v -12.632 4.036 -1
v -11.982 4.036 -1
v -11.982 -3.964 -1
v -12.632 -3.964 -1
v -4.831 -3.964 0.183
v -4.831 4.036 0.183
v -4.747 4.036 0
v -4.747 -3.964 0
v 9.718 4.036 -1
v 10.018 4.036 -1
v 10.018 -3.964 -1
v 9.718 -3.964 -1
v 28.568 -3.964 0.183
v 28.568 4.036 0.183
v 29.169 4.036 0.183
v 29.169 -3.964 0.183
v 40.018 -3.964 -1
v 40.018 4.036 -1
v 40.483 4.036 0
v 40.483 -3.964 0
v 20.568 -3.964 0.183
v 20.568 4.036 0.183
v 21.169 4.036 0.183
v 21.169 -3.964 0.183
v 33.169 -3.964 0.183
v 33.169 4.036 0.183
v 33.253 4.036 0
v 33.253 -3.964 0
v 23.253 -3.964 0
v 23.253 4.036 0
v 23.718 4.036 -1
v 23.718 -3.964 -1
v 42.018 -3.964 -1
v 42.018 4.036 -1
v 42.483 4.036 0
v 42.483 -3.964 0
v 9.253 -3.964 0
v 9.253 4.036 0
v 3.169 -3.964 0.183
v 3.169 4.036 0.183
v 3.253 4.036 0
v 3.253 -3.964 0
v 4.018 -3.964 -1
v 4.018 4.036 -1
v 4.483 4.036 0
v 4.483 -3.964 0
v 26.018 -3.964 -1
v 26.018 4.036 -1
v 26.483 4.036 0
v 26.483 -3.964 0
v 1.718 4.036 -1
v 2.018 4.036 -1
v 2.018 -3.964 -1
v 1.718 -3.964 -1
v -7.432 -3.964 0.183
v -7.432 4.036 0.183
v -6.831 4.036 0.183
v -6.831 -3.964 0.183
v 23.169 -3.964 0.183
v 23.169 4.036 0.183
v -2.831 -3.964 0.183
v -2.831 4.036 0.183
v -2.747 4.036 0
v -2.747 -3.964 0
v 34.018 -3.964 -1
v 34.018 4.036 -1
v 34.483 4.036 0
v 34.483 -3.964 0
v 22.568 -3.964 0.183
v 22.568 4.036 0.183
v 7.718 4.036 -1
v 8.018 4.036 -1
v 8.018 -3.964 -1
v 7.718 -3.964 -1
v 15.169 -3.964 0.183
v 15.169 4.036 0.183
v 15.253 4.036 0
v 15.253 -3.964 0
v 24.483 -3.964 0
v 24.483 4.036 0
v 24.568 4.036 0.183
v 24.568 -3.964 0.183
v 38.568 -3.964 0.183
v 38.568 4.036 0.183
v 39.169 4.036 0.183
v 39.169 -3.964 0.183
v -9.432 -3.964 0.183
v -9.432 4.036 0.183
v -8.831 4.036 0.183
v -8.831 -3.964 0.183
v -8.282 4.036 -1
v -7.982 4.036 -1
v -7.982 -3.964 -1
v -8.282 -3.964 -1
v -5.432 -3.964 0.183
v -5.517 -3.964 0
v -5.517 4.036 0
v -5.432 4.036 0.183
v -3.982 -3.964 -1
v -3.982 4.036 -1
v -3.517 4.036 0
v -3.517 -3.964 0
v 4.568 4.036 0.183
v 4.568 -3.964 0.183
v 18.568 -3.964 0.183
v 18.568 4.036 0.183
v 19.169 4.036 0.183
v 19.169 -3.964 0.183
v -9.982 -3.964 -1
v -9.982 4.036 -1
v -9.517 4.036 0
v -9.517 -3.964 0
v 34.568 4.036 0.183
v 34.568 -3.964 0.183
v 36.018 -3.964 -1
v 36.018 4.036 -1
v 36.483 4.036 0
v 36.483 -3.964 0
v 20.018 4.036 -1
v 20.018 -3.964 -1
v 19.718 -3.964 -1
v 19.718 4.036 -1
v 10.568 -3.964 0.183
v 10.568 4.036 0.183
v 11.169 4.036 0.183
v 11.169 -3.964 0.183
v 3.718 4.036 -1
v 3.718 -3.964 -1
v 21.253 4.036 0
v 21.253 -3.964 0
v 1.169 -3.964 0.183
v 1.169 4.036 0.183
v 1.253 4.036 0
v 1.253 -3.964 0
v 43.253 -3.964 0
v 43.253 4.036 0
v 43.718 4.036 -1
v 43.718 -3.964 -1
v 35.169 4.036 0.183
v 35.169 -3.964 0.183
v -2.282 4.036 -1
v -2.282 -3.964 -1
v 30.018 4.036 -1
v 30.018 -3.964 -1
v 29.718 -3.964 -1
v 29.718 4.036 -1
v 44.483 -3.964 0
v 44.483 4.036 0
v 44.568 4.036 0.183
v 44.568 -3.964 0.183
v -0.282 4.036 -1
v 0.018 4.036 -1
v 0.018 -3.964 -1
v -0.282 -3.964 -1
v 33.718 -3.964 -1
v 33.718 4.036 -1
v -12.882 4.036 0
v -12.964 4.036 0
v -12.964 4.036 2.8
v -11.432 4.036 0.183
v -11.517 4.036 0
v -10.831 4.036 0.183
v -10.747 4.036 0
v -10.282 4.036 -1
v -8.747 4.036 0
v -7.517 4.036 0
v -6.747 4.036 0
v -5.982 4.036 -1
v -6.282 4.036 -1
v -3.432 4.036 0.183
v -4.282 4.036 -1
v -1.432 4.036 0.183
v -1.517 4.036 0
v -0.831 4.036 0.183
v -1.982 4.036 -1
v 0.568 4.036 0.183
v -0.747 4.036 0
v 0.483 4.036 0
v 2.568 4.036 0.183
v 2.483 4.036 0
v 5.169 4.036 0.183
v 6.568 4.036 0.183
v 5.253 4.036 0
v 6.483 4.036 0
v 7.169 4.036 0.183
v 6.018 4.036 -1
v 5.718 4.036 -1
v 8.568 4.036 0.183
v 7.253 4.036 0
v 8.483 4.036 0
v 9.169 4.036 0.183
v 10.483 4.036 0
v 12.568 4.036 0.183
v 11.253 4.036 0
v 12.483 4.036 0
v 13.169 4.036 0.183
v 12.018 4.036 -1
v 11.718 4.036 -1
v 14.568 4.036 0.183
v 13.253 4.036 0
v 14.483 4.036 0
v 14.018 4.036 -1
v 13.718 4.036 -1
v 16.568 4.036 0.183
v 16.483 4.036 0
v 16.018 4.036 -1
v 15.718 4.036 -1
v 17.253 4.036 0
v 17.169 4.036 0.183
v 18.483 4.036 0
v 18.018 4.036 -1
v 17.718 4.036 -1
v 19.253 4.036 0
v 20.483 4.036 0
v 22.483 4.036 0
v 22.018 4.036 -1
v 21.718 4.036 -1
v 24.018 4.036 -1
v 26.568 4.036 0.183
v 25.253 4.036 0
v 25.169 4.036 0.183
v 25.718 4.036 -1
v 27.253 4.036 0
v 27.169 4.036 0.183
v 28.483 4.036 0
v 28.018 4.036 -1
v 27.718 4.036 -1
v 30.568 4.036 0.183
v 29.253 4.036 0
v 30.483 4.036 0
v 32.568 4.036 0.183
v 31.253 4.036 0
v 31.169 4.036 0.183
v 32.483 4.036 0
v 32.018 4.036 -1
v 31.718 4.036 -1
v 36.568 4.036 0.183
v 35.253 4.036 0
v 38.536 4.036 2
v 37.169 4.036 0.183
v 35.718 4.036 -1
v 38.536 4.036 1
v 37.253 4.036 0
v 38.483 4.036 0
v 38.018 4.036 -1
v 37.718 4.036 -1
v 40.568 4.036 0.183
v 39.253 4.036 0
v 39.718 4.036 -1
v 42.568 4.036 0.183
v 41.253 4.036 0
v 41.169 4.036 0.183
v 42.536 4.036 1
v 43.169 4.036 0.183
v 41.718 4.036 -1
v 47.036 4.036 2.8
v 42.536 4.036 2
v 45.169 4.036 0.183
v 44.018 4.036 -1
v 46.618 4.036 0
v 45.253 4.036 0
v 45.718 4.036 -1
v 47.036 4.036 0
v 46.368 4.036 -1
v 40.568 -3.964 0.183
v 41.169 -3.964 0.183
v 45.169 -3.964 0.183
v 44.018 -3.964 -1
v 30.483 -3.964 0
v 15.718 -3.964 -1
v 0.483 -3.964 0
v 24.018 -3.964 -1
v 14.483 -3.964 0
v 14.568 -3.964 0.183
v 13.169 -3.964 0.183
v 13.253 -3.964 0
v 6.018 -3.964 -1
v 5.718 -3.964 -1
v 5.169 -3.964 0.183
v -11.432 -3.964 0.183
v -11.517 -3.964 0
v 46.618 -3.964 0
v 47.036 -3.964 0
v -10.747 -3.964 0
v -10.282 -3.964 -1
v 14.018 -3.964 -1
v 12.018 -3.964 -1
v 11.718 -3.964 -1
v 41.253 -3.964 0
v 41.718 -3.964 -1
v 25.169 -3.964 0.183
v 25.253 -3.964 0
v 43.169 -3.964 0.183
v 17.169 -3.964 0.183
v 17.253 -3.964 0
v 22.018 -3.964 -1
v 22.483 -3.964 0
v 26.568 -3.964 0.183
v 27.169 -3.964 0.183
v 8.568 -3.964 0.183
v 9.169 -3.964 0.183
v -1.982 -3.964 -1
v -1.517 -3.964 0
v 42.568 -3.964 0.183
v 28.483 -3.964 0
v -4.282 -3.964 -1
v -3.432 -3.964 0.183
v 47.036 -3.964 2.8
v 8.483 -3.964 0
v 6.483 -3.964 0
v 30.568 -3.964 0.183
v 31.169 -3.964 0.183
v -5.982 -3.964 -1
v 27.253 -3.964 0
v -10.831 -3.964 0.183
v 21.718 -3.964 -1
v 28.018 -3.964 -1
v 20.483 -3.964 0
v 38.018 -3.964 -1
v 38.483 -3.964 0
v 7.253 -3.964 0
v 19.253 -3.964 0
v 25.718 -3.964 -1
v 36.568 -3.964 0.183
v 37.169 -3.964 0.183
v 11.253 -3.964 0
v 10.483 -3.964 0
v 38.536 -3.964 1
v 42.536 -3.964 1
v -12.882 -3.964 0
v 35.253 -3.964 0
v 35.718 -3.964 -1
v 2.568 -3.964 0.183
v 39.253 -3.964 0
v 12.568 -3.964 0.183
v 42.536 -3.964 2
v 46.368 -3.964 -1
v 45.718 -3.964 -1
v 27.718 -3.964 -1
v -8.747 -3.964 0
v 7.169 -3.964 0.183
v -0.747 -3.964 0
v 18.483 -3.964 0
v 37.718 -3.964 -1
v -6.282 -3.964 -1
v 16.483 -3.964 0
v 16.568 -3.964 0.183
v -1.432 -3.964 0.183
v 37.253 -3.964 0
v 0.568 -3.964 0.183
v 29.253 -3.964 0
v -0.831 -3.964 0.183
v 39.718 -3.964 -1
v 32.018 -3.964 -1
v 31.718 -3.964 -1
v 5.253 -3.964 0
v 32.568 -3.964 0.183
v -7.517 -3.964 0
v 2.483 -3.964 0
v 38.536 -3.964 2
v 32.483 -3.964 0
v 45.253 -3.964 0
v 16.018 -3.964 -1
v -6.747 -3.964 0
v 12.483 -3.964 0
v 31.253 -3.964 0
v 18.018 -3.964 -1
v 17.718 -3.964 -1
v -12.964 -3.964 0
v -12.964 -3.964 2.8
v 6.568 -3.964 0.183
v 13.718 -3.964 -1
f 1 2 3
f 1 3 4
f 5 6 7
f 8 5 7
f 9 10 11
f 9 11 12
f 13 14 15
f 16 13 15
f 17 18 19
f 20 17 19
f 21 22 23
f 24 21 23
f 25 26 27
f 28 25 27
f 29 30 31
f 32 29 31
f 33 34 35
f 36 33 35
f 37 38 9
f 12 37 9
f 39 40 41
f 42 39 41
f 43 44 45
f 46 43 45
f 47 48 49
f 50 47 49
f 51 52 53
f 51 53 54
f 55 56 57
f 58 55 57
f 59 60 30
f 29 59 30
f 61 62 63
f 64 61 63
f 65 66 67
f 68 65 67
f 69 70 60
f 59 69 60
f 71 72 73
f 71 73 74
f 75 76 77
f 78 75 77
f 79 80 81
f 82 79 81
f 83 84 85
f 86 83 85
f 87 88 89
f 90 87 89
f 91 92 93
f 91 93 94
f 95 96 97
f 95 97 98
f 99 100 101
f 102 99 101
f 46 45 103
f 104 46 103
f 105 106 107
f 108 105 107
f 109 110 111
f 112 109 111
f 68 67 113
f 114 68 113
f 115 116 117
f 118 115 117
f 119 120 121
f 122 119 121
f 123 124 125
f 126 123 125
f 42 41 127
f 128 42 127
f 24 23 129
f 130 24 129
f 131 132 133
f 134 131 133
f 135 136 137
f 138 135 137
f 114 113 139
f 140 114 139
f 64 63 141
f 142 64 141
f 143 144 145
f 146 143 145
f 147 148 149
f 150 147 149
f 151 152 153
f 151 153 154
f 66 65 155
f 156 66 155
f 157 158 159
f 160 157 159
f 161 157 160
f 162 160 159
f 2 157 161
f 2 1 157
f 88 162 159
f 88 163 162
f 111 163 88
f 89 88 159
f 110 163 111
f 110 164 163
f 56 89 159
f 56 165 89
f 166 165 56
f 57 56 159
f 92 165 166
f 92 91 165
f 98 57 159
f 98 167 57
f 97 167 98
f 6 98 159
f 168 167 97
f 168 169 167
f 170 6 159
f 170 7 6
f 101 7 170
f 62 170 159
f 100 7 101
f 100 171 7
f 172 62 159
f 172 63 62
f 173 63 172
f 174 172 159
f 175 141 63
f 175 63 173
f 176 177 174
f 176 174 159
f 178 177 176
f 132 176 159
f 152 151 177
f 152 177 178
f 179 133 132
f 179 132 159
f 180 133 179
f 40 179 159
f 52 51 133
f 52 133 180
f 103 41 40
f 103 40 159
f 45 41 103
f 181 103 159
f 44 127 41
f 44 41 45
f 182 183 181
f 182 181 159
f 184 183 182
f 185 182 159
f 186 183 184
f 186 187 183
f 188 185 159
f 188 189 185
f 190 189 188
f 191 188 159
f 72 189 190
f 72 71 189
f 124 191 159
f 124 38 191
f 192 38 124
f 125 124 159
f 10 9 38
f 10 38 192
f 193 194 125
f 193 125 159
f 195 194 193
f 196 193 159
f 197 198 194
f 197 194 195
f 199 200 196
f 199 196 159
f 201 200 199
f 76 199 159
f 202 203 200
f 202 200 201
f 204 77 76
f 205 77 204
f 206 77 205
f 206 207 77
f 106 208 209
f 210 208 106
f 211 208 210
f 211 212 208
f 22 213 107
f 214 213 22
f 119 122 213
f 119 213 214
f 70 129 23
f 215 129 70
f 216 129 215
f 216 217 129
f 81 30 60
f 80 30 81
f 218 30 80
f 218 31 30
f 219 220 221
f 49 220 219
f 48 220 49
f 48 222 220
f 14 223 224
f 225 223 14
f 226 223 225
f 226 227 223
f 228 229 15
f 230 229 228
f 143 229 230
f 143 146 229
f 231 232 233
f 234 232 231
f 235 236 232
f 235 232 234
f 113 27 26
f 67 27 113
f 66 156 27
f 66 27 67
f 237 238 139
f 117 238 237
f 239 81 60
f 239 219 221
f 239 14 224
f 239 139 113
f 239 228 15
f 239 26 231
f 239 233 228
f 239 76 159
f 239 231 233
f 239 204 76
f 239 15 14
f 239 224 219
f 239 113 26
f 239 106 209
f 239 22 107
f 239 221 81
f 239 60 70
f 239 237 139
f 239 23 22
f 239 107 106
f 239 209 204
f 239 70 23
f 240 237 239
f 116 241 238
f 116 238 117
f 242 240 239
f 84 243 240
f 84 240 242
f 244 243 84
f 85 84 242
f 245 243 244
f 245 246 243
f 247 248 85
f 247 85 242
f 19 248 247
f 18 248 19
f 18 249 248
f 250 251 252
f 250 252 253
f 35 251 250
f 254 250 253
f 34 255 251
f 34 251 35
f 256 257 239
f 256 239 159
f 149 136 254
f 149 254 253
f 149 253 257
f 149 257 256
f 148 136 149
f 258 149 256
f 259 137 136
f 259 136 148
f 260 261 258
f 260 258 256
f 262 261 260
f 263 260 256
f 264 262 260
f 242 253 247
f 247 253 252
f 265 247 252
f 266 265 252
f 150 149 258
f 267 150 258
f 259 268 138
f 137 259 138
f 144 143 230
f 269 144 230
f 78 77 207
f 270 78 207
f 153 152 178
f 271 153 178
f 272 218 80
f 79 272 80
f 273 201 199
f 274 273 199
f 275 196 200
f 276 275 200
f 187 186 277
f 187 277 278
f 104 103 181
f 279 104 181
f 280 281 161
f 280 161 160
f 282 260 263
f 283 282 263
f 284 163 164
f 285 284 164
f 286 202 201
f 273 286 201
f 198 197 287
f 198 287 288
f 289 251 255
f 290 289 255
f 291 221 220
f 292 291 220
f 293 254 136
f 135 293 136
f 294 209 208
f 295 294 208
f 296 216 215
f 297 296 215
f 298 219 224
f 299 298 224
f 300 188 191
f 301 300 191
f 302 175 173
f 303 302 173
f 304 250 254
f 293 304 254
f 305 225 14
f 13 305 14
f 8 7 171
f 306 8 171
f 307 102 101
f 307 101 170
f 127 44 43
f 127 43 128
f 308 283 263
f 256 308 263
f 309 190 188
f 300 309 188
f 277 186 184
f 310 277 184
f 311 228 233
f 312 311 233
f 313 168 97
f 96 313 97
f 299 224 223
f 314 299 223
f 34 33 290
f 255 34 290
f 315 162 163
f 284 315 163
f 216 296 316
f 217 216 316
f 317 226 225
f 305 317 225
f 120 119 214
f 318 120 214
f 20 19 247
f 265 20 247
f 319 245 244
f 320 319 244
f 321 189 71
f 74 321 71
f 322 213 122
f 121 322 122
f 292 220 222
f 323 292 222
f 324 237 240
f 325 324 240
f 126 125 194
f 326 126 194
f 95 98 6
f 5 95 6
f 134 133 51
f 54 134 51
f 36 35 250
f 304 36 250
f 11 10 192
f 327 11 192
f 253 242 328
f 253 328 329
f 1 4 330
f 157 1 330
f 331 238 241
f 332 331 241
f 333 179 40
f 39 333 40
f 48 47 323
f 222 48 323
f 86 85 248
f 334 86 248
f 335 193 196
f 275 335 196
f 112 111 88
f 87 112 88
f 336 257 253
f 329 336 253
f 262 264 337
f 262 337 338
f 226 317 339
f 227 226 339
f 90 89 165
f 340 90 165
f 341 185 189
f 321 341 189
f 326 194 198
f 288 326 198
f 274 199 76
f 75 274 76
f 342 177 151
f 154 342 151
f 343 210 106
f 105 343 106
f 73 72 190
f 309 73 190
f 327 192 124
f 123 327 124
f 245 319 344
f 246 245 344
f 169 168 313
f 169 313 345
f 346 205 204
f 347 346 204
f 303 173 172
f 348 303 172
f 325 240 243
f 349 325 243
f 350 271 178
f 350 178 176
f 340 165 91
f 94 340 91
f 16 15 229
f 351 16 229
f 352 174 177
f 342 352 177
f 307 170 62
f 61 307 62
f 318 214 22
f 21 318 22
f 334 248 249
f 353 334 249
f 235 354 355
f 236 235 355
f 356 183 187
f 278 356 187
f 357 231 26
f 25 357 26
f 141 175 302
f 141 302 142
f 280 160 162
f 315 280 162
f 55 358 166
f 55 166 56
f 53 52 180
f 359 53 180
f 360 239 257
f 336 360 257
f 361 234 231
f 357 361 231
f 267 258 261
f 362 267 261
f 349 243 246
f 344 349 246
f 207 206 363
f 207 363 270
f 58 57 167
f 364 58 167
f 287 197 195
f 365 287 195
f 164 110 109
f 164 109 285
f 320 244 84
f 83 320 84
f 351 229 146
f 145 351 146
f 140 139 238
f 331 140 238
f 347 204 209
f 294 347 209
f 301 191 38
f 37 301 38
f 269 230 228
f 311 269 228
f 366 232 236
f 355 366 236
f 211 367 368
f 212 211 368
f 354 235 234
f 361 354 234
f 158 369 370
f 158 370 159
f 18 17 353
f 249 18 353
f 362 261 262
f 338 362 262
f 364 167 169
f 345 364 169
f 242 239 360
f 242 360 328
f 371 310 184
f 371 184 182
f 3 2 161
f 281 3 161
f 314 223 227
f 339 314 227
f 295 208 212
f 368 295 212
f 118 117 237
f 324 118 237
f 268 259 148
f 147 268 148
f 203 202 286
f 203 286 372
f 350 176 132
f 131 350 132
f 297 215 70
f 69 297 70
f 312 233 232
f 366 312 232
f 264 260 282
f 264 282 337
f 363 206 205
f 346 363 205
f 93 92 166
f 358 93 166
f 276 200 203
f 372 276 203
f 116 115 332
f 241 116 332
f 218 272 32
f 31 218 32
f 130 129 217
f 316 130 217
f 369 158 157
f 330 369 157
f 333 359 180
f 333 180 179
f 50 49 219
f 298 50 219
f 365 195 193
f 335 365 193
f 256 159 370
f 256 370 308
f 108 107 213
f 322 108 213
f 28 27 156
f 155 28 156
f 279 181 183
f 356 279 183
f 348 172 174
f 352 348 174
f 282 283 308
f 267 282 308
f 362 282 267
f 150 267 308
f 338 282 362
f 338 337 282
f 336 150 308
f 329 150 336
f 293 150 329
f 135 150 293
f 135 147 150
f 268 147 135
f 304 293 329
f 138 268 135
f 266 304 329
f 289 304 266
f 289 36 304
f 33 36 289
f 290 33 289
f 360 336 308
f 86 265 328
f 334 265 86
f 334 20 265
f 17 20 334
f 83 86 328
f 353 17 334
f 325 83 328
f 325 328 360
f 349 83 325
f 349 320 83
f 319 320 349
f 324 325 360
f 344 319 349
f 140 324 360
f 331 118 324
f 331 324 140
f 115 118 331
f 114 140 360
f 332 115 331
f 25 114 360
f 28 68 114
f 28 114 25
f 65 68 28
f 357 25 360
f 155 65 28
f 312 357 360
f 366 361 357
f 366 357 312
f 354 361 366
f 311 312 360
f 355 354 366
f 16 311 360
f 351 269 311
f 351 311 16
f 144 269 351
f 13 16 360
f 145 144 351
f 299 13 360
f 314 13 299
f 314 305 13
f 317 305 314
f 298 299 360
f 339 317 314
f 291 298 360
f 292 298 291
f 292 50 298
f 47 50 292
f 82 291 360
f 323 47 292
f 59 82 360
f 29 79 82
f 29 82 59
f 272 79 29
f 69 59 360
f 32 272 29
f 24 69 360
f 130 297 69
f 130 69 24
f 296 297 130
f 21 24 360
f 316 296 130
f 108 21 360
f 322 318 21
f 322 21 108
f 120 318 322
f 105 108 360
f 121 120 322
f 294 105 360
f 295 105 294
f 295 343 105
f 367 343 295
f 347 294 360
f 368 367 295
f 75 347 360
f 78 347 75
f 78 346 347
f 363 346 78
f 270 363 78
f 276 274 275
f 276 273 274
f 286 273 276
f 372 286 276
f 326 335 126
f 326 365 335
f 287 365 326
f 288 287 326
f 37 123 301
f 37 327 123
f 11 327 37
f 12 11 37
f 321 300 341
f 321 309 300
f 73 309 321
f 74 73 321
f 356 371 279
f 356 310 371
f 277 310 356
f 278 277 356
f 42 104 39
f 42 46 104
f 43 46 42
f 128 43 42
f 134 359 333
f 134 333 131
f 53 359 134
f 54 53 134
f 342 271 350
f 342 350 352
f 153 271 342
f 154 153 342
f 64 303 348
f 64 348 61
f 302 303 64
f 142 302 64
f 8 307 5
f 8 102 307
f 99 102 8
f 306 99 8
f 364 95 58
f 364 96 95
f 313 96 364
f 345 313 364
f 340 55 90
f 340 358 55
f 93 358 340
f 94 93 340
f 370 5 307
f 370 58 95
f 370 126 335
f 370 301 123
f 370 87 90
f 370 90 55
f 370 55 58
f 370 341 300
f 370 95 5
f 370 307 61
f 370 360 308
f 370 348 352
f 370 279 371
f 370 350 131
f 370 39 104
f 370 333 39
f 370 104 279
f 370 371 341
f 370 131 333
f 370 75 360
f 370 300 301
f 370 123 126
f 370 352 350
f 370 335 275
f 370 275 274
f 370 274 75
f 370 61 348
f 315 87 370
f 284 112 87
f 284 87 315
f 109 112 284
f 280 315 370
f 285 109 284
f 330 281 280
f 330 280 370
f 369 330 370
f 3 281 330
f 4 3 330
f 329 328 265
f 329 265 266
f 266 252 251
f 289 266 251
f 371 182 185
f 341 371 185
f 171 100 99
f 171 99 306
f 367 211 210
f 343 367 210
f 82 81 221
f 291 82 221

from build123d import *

# Parameters (mm, degrees)
SKETCH_1_W               = 60
SKETCH_1_H               = 10
EXTRUDE_1_DEPTH          = 2.8
EXTRUDE_2_DEPTH          = 5
PATTERN_LINEAR_1_COUNT   = 30
PATTERN_LINEAR_1_PITCH   = 2
CUT_EXTRUDE_1_DEPTH      = 10.1
PATTERN_LINEAR_2_COUNT   = 29
PATTERN_LINEAR_2_PITCH   = 2
CUT_EXTRUDE_4_DEPTH      = 5
CUT_EXTRUDE_4_DEPTH_BACK = 5
SKETCH_5_W               = 60
SKETCH_5_H               = 1
CUT_EXTRUDE_5_DEPTH      = 10
CUT_EXTRUDE_5_DEPTH_BACK = 10
SKETCH_6_W               = 4
SKETCH_6_H               = 1


with BuildPart() as part:
    # 草圖1 → 填料-伸長1 (new body)
    with BuildSketch(Plane.XY):
        with Locations((17.035714286, 0.035714286)):
            Rectangle(SKETCH_1_W, SKETCH_1_H)
    extrude(amount=EXTRUDE_1_DEPTH)

    # 草圖3 → 填料-伸長2 (add, symmetric)
    with BuildSketch(Plane(origin=(0, 0, 0), x_dir=(1, 0, 0), z_dir=(0, 1, 0))):
        Polygon((-12.88158197, 0), (-11.38158197, 0), (-11.63158197, 1), (-12.63158197, 1), align=None)
    extrude_2 = extrude(amount=EXTRUDE_2_DEPTH, both=True)

    # 直線複製排列1: 填料-伸長2 ×30
    with Locations(*[(i * PATTERN_LINEAR_1_PITCH, 0, 0) for i in range(1, PATTERN_LINEAR_1_COUNT)]):
        add(extrude_2)

    # 草圖4 → 除料-伸長1 (cut)
    with BuildSketch(Plane(origin=(0, 5.035714286, 0), x_dir=(1, 0, 0), z_dir=(0, 1, 0))):
        Polygon((-11.51663584, 0), (-11.431760496, -0.182548771), (-10.831403444, -0.182548771), (-10.746528099, 0), (-10.28158197, 1), (-11.98158197, 1), align=None)
    cut_extrude_1 = extrude(amount=-CUT_EXTRUDE_1_DEPTH, mode=Mode.SUBTRACT)

    # 直線複製排列2: 除料-伸長1 ×29
    with Locations(*[(i * PATTERN_LINEAR_2_PITCH, 0, 0) for i in range(1, PATTERN_LINEAR_2_COUNT)]):
        add(cut_extrude_1, mode=Mode.SUBTRACT)

    # 草圖5 → 除料-伸長4 (cut, two sides: drawn at the far end of the back side and taken through both)
    with BuildSketch(Plane.XY.offset(-CUT_EXTRUDE_4_DEPTH_BACK)):
        Polygon((-12.964285714, -3.964285714), (-12.964285714, -4.964285714), (-12.964285714, -5.413989132), (47.035714286, -5.088807164), (47.035714286, -3.964285714), align=None)
        with Locations((17.035714286, 4.535714286)):
            Rectangle(SKETCH_5_W, SKETCH_5_H)
    extrude(amount=CUT_EXTRUDE_4_DEPTH + CUT_EXTRUDE_4_DEPTH_BACK, mode=Mode.SUBTRACT)

    # 草圖6 → 除料-伸長5 (cut, two sides: drawn at the far end of the back side and taken through both)
    with BuildSketch(Plane(origin=(0, 4.035714286, 0), x_dir=(1, 0, 0), z_dir=(0, 1, 0)).offset(-CUT_EXTRUDE_5_DEPTH_BACK)):
        with Locations((40.535714286, -1.5)):
            Rectangle(SKETCH_6_W, SKETCH_6_H)
    extrude(amount=CUT_EXTRUDE_5_DEPTH + CUT_EXTRUDE_5_DEPTH_BACK, mode=Mode.SUBTRACT)


solid = part.part
